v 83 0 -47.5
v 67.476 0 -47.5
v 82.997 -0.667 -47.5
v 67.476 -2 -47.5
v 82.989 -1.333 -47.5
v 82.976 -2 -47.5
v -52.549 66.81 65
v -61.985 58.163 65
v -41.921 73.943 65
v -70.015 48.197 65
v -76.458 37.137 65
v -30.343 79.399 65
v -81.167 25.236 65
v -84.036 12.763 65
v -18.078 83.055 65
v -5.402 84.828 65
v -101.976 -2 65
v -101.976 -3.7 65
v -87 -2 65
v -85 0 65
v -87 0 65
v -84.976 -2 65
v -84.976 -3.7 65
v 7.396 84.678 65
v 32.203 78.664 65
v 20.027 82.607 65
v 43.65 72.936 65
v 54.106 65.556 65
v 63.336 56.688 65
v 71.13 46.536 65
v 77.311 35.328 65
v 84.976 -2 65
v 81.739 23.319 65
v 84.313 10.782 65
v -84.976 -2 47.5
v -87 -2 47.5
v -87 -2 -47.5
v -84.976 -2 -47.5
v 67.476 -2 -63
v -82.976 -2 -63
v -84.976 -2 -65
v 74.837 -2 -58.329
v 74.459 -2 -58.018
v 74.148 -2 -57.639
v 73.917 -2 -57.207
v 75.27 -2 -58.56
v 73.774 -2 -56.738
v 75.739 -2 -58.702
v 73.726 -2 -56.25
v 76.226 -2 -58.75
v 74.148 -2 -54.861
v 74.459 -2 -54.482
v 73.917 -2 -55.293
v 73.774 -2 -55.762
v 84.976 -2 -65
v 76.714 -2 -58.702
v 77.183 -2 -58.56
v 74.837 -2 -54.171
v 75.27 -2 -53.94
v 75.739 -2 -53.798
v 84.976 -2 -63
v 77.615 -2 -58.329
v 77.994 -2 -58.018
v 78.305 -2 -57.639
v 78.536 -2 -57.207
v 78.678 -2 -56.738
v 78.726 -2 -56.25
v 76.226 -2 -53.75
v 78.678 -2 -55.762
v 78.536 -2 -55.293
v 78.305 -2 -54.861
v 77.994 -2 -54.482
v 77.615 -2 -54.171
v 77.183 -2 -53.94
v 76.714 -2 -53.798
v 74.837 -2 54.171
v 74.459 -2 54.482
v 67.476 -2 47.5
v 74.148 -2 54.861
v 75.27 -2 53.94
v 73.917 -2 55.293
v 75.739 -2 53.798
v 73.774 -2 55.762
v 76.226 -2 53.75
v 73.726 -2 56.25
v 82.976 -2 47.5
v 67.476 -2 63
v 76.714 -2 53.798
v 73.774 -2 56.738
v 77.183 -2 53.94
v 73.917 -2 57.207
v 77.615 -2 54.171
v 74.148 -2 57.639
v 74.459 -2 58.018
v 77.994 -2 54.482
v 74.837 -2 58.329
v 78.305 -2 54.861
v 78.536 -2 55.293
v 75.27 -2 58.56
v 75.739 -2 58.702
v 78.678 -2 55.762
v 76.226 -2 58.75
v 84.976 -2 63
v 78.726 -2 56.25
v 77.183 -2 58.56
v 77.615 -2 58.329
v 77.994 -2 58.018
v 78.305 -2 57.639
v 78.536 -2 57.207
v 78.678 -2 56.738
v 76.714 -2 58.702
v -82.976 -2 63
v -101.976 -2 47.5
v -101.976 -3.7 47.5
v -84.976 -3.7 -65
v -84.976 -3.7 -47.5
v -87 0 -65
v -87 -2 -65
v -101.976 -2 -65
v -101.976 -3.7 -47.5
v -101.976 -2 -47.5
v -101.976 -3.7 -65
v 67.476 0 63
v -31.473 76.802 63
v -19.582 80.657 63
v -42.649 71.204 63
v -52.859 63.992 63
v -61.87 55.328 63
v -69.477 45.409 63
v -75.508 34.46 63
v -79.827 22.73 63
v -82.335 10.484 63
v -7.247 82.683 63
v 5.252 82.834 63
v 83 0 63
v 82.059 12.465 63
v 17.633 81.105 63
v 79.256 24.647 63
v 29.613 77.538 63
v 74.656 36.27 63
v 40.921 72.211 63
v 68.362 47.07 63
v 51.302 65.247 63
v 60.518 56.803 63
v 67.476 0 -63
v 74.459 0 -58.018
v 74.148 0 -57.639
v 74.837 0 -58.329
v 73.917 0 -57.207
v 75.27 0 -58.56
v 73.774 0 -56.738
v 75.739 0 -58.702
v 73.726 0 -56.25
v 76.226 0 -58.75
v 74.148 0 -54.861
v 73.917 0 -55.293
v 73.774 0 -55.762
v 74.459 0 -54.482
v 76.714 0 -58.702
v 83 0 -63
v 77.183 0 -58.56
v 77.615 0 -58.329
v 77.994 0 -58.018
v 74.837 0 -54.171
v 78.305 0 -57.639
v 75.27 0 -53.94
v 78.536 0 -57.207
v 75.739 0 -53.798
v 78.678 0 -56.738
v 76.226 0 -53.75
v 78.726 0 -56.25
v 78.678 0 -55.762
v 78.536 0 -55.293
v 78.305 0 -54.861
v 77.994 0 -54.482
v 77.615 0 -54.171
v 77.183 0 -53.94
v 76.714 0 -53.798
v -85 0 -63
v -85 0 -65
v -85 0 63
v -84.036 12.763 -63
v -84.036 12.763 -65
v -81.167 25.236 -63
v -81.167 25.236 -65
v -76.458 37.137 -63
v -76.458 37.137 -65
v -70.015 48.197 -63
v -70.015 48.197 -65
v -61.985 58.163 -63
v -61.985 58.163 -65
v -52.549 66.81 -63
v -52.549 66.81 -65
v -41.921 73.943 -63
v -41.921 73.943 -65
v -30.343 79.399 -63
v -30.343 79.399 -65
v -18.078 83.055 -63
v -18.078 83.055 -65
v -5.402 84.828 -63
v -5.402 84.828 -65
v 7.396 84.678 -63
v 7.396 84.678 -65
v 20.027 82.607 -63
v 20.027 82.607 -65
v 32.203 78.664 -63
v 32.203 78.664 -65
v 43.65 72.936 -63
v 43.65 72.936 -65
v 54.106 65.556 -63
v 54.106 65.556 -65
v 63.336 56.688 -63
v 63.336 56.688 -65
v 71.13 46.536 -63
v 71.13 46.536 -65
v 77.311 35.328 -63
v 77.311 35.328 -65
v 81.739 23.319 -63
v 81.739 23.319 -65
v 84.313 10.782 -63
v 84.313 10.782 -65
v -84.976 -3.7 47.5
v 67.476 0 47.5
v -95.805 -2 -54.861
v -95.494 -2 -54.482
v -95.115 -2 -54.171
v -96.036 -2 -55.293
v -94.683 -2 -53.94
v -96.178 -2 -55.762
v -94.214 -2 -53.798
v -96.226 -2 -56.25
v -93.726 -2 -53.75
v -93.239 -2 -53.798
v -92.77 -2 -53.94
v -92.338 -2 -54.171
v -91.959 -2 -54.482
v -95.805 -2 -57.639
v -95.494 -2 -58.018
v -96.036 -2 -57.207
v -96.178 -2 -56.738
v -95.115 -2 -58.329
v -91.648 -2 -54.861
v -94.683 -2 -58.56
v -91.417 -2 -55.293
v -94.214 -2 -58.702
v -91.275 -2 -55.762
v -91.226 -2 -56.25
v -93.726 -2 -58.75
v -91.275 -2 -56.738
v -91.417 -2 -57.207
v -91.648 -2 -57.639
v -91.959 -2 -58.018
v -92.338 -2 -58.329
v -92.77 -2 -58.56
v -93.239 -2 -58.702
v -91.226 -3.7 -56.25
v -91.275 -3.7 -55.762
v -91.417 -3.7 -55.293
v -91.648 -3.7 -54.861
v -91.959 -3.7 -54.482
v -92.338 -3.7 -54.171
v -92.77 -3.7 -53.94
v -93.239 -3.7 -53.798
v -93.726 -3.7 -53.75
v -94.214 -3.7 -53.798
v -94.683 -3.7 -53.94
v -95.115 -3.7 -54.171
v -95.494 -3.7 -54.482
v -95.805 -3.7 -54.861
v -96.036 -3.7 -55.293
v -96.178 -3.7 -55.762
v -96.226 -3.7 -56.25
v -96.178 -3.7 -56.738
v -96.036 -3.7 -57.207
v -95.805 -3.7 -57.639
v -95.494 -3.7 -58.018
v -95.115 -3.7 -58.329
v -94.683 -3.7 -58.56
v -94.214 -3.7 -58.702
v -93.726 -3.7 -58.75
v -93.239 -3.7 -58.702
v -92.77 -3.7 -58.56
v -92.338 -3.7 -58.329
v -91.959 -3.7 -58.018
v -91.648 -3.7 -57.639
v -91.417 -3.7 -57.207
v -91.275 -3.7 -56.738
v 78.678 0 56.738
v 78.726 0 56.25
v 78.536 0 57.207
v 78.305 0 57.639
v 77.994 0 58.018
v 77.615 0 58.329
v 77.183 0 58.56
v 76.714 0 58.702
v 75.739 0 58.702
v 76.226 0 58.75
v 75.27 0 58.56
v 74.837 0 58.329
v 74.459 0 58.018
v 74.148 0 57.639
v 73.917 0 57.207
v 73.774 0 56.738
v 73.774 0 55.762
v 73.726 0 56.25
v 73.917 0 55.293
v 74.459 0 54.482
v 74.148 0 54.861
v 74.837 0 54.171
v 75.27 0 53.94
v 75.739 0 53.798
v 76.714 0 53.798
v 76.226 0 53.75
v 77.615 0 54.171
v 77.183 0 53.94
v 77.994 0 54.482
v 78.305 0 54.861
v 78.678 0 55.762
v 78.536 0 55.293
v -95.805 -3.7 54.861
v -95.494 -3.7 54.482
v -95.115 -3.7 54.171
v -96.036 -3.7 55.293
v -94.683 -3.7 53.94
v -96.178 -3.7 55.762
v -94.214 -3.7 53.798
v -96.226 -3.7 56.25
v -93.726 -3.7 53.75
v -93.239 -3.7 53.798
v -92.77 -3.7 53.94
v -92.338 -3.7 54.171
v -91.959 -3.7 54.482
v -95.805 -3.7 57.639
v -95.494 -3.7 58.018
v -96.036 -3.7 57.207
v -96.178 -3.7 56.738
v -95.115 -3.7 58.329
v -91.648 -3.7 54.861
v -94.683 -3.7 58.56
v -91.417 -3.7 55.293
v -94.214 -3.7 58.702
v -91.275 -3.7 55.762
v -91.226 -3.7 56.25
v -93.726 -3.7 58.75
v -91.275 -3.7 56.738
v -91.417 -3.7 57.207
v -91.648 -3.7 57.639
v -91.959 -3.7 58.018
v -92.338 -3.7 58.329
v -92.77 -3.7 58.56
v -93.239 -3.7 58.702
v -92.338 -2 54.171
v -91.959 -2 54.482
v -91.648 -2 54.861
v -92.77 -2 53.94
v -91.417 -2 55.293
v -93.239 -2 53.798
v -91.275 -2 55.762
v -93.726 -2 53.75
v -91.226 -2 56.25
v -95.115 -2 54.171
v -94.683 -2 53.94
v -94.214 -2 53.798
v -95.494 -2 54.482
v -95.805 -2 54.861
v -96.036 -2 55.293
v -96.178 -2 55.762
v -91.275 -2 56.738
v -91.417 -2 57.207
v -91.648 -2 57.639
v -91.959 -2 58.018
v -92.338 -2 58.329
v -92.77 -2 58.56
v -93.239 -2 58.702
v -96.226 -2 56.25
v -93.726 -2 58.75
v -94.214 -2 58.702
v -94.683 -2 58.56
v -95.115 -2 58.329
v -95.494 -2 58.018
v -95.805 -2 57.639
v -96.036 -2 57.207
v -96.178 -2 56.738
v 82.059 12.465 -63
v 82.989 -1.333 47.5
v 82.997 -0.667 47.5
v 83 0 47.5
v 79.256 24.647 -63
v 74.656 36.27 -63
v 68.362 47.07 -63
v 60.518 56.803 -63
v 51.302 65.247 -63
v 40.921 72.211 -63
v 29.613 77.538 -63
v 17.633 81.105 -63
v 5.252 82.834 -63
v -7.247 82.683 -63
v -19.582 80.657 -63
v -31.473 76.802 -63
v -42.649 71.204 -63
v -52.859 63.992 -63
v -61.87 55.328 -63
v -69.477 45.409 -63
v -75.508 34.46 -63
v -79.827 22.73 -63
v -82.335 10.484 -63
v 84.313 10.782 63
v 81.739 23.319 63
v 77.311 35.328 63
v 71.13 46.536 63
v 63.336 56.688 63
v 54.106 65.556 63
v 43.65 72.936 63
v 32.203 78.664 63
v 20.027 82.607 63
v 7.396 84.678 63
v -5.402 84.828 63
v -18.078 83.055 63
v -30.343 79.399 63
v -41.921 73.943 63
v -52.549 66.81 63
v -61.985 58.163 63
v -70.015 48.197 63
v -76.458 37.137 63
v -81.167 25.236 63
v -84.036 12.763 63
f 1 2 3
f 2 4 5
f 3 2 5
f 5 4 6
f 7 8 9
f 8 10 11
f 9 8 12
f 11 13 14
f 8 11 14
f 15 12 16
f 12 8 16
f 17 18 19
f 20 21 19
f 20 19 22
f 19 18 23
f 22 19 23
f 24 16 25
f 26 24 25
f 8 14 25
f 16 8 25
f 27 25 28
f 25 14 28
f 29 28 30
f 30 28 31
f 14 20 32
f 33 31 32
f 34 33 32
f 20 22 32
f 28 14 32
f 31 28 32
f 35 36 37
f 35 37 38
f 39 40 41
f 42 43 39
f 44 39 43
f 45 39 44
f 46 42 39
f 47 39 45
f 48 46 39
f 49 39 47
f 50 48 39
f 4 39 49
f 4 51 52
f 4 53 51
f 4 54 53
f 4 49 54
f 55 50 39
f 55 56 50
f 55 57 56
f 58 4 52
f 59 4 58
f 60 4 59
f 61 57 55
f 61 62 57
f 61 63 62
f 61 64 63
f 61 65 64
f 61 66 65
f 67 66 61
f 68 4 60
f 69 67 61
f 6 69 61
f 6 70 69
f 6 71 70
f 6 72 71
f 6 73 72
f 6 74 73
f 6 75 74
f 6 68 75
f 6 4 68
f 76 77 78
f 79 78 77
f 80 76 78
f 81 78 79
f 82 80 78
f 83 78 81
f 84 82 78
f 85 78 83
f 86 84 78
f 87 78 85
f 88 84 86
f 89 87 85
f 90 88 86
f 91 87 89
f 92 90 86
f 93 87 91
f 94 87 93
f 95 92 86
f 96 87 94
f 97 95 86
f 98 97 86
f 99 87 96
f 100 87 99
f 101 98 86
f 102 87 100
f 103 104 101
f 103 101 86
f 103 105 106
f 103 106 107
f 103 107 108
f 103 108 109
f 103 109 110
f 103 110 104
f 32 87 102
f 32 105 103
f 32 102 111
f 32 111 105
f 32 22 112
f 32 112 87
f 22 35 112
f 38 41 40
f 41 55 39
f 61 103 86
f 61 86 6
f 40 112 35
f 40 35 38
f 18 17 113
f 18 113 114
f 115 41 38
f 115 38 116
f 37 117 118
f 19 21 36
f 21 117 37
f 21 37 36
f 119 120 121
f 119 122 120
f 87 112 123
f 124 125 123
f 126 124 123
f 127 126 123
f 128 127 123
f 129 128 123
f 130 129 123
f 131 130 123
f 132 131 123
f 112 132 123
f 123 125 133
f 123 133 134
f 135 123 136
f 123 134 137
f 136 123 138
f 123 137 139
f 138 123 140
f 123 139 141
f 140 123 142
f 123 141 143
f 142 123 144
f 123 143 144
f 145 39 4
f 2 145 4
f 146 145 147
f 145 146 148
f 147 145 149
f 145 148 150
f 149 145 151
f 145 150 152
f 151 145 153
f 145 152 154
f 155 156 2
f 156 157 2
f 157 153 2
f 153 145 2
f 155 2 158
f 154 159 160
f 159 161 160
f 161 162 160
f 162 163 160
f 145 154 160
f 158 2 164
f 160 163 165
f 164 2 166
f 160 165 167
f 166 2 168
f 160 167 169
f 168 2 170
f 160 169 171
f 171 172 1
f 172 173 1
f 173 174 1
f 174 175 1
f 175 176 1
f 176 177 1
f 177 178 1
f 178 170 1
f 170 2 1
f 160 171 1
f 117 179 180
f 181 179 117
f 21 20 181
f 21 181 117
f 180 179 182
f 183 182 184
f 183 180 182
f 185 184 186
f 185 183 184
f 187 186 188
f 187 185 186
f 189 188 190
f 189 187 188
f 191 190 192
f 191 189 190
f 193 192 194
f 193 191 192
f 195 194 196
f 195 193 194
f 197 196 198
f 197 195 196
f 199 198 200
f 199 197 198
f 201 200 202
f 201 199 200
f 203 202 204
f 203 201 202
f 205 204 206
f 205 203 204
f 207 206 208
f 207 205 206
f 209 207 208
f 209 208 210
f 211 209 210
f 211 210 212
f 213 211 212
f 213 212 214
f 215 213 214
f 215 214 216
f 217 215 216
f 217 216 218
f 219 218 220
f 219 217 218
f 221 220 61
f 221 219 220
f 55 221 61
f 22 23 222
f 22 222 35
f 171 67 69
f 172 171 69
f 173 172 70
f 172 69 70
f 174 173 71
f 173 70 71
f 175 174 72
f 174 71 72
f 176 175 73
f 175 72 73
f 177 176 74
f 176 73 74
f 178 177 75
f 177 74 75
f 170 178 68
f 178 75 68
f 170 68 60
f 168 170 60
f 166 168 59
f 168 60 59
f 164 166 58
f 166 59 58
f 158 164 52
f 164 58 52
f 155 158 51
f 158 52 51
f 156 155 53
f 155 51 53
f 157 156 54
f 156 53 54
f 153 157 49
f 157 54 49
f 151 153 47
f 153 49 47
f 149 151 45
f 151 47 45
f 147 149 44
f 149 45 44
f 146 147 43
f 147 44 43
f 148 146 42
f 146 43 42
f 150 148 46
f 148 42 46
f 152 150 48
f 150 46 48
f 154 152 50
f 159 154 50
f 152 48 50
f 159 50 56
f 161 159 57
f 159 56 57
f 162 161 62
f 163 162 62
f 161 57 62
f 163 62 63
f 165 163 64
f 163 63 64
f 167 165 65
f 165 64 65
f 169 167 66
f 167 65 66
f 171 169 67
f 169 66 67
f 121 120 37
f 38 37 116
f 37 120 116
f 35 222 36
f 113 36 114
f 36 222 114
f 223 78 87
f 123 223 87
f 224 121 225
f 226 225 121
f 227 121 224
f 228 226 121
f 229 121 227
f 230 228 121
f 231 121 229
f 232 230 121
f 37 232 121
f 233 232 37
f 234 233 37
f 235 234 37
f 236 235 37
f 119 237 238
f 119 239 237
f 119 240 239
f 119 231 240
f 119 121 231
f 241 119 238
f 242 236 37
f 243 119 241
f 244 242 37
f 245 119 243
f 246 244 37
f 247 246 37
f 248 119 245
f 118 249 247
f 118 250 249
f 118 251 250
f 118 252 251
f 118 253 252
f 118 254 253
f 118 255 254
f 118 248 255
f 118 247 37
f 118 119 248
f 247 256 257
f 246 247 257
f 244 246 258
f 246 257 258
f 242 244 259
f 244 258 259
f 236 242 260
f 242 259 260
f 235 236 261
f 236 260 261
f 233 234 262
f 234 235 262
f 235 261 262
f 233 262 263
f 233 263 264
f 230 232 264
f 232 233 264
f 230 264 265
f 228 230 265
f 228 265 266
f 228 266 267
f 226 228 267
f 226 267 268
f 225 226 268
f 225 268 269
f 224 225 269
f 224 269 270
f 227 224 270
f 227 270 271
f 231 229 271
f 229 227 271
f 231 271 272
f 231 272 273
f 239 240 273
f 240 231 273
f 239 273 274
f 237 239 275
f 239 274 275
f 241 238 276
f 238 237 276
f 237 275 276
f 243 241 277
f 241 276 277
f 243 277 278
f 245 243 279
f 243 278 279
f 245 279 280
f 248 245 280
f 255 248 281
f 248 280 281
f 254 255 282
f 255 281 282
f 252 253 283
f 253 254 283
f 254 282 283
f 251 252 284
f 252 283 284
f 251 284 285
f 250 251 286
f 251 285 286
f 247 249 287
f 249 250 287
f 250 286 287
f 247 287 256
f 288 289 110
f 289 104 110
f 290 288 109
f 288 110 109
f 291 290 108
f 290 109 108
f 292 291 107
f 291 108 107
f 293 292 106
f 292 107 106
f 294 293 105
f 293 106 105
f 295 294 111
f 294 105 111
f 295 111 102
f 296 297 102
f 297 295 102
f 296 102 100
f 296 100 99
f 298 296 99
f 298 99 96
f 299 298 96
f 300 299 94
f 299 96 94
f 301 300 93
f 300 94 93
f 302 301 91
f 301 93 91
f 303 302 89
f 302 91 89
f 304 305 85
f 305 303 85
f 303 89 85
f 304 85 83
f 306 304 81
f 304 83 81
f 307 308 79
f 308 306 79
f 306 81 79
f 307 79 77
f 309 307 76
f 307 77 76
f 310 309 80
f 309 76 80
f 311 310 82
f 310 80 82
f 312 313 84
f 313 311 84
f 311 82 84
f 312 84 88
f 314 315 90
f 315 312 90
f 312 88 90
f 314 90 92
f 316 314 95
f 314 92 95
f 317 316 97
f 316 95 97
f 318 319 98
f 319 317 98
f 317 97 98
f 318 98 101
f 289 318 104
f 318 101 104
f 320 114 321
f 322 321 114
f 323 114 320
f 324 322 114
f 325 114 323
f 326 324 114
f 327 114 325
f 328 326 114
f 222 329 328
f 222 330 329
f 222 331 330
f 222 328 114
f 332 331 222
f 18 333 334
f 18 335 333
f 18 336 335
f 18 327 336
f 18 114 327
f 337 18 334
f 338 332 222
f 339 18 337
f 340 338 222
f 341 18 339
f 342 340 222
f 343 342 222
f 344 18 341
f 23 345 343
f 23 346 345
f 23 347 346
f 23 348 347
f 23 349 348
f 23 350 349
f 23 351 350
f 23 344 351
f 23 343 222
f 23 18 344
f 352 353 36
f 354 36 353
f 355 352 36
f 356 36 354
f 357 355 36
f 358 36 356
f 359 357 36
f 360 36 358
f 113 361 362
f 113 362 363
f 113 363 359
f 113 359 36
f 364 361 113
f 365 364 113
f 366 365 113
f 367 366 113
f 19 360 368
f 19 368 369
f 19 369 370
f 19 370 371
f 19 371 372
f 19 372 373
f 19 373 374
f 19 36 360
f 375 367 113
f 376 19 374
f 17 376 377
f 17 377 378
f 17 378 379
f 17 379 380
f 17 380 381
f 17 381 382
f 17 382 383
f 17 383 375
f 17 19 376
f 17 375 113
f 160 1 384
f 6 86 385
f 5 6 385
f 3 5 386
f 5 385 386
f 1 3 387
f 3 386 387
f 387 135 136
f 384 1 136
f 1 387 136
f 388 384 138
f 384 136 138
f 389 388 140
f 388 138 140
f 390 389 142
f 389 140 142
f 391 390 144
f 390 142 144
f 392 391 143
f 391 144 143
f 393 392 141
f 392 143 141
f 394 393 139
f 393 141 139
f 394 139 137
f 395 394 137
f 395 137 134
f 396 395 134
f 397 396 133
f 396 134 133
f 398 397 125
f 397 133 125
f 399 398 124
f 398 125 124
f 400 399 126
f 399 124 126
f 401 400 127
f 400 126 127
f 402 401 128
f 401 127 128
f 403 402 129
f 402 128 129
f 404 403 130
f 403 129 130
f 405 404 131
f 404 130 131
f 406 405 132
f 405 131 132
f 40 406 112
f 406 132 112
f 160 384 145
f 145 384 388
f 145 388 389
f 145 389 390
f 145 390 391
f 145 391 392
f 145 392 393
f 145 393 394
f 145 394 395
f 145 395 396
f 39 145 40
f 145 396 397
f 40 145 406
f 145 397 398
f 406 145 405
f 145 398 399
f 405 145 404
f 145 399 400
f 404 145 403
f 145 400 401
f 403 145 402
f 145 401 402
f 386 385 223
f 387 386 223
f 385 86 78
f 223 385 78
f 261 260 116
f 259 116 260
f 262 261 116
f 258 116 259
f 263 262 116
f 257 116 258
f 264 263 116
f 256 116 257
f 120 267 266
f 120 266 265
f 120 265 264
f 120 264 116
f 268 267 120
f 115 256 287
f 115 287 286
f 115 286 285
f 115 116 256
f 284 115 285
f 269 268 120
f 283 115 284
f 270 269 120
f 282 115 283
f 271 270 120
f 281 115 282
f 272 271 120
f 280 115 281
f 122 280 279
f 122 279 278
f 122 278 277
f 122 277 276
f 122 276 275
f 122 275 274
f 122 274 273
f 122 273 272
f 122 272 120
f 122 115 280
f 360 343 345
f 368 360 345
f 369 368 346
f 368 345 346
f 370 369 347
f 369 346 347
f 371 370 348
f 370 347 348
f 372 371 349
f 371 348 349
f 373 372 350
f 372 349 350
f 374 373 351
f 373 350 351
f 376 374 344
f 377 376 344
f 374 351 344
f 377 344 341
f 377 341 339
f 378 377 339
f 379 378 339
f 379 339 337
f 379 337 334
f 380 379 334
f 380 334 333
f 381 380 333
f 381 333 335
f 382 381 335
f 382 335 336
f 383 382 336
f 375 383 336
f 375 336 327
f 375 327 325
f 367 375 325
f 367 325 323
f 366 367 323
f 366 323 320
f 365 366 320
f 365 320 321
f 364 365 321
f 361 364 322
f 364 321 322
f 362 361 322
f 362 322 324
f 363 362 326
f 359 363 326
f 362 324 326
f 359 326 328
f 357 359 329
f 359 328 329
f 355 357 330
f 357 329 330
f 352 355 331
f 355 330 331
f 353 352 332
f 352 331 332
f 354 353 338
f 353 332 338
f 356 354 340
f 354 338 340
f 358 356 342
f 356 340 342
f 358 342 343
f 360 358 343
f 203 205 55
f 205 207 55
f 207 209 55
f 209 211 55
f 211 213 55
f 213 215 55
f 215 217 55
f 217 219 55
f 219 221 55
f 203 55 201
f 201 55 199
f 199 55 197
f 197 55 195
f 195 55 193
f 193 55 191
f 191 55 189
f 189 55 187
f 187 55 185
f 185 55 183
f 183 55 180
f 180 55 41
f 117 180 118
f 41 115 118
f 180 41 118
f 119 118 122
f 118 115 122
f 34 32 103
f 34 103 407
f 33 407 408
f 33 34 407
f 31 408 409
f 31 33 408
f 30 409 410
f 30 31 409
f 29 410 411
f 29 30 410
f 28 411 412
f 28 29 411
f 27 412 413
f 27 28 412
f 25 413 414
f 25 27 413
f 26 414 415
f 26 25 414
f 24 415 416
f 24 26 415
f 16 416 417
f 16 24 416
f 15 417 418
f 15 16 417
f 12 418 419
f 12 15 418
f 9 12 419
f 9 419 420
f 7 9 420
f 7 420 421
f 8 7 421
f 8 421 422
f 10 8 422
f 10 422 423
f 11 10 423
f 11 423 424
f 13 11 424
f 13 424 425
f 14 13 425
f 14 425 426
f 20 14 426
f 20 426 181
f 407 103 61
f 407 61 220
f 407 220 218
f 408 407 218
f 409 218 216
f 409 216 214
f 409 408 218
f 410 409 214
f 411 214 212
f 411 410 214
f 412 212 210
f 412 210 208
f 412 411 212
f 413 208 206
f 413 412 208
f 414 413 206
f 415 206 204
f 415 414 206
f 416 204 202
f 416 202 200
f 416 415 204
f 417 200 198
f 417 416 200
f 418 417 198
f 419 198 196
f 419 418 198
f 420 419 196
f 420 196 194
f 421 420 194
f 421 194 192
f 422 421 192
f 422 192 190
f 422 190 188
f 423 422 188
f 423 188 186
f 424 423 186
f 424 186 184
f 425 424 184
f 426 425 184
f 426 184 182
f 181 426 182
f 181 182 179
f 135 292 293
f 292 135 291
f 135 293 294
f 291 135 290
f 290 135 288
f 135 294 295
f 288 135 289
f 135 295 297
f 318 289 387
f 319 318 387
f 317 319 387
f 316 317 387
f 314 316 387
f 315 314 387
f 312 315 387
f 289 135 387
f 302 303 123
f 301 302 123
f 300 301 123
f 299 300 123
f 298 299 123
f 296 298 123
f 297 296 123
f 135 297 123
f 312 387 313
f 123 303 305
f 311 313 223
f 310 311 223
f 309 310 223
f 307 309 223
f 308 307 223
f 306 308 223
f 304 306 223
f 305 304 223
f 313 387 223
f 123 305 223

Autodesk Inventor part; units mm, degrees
ref_plane "YZ Plane" through (0, 0, 0) normal (1, 0, 0) x (0, 1, 0)
ref_plane "XZ Plane" through (0, 0, 0) normal (0, 1, 0) x (-1, 0, 0)
ref_plane "Work Plane1" through (0, 0, 65) normal (0, 0, 1) x (1, 0, 0)
sketch "Sketch1" plane through (0, 0, 65) normal (0, 0, 1) x (1, 0, 0)
  circle A0 centre (0, 0) radius 85
  line L0 (85, 0) -> (-85, 0)
  line L1 (85, 0) -> (-87, 0)
  line L2 (-87, 0) -> (-87, -2)
  line L3 (-87, -2) -> (85, -2)
  line L4 (85, -2) -> (85, 0)
  line L5 (-84.9765, -2) -> (-101.9765, -2)
  line L6 (-101.9765, -2) -> (-101.9765, -3.7)
  line L7 (-101.9765, -3.7) -> (-84.9765, -3.7)
  line L8 (-84.9765, -3.7) -> (-84.9765, -2)
  point P0 (-87, -1)
  point P1 (85, -1)
  point P2 (84.9765, -2)
  dimension "d1" = 170
  dimension "d2" = 2
  dimension "d3" = 0
  dimension "d4" = 172
  dimension "d5" = 17
  dimension "d6" = 1.7
extrude "Extrusion1" add sketch "Sketch1" against normal blind 2 contours L0 A0 | A0 L3 L0 | A0 L3 L2 L1 | L8 L7 L6 L5 L3
mirror "Mirror1" about plane through (0, 0, 0) normal (0, 0, 1) of "Extrusion1"
sketch "Sketch2" plane through (0, 0, 63) normal (0, 0, -1) x (-1, 0, 0)
  circle A0 centre (0, 0) radius 83
  arc A1 (85, 0) -> (-84.9765, -2) centre (0, 0) ccw projected
  line L0 (87, 0) -> (87, -2) projected
  line L1 (85, 0) -> (87, 0)
  line L2 (87, 0) -> (87, -2)
  line L3 (87, -2) -> (82.9759, -2)
  line L4 (84.9765, -2) -> (-84.9765, -2) projected
  line L5 (-82.9759, -2) -> (-84.9765, -2)
  circle A2 centre (0, 0) radius 85
  dimension "d9" = 2
  dimension "d10" = 170
extrude "Extrusion2" add sketch "Sketch2" along normal up to surface (126 mm away) contours A0 L4 A1 A2 L3 | A2 L1 L0 L3
sketch "Sketch3" plane through (-101.9765, -3.7, 65) normal (0, -1, 0) x (1, 0, 0)
  line L0 (0, 0) -> (17, 0) projected
  line L1 (0, 0) -> (17, 0)
  line L2 (17, 0) -> (17, -17.5)
  line L3 (17, -17.5) -> (0, -17.5)
  line L4 (0, -17.5) -> (0, 0)
  circle A0 centre (8.25, -8.75) radius 2.5
  point P0 (101.9765, -65)
  dimension "d13" = 17
  dimension "d14" = 17.5
  dimension "d15" = 5
  dimension "d16" = 8.75
  dimension "d17" = 8.75
extrude "Extrusion3" add sketch "Sketch3" against normal up to surface (1.7 mm away)
mirror "Mirror2" about plane through (0, 0, 0) normal (0, 0, 1) of "Extrusion3"
sketch "Sketch4" plane through (-84.9765, -2, 65) normal (0, -1, 0) x (1, 0, 0)
  line L0 (169.9529, 0) -> (169.9529, -130) projected
  line L1 (169.9529, -130) -> (152.4529, -130)
  line L2 (152.4529, -130) -> (152.4529, -112.5)
  line L3 (152.4529, -112.5) -> (169.9529, -112.5)
  line L4 (169.9529, -112.5) -> (169.9529, -130)
  circle A0 centre (161.2029, -121.25) radius 2.5
  point P0 (84.9765, -65)
  dimension "d20" = 17.5
  dimension "d21" = 17.5
  dimension "d22" = 5
  dimension "d23" = 8.75
  dimension "d24" = 8.75
extrude "Extrusion4" add sketch "Sketch4" against normal blind 2
mirror "Mirror3" about plane through (0, 0, 0) normal (0, 0, 1) of "Extrusion4"
properties part number "coupol"
